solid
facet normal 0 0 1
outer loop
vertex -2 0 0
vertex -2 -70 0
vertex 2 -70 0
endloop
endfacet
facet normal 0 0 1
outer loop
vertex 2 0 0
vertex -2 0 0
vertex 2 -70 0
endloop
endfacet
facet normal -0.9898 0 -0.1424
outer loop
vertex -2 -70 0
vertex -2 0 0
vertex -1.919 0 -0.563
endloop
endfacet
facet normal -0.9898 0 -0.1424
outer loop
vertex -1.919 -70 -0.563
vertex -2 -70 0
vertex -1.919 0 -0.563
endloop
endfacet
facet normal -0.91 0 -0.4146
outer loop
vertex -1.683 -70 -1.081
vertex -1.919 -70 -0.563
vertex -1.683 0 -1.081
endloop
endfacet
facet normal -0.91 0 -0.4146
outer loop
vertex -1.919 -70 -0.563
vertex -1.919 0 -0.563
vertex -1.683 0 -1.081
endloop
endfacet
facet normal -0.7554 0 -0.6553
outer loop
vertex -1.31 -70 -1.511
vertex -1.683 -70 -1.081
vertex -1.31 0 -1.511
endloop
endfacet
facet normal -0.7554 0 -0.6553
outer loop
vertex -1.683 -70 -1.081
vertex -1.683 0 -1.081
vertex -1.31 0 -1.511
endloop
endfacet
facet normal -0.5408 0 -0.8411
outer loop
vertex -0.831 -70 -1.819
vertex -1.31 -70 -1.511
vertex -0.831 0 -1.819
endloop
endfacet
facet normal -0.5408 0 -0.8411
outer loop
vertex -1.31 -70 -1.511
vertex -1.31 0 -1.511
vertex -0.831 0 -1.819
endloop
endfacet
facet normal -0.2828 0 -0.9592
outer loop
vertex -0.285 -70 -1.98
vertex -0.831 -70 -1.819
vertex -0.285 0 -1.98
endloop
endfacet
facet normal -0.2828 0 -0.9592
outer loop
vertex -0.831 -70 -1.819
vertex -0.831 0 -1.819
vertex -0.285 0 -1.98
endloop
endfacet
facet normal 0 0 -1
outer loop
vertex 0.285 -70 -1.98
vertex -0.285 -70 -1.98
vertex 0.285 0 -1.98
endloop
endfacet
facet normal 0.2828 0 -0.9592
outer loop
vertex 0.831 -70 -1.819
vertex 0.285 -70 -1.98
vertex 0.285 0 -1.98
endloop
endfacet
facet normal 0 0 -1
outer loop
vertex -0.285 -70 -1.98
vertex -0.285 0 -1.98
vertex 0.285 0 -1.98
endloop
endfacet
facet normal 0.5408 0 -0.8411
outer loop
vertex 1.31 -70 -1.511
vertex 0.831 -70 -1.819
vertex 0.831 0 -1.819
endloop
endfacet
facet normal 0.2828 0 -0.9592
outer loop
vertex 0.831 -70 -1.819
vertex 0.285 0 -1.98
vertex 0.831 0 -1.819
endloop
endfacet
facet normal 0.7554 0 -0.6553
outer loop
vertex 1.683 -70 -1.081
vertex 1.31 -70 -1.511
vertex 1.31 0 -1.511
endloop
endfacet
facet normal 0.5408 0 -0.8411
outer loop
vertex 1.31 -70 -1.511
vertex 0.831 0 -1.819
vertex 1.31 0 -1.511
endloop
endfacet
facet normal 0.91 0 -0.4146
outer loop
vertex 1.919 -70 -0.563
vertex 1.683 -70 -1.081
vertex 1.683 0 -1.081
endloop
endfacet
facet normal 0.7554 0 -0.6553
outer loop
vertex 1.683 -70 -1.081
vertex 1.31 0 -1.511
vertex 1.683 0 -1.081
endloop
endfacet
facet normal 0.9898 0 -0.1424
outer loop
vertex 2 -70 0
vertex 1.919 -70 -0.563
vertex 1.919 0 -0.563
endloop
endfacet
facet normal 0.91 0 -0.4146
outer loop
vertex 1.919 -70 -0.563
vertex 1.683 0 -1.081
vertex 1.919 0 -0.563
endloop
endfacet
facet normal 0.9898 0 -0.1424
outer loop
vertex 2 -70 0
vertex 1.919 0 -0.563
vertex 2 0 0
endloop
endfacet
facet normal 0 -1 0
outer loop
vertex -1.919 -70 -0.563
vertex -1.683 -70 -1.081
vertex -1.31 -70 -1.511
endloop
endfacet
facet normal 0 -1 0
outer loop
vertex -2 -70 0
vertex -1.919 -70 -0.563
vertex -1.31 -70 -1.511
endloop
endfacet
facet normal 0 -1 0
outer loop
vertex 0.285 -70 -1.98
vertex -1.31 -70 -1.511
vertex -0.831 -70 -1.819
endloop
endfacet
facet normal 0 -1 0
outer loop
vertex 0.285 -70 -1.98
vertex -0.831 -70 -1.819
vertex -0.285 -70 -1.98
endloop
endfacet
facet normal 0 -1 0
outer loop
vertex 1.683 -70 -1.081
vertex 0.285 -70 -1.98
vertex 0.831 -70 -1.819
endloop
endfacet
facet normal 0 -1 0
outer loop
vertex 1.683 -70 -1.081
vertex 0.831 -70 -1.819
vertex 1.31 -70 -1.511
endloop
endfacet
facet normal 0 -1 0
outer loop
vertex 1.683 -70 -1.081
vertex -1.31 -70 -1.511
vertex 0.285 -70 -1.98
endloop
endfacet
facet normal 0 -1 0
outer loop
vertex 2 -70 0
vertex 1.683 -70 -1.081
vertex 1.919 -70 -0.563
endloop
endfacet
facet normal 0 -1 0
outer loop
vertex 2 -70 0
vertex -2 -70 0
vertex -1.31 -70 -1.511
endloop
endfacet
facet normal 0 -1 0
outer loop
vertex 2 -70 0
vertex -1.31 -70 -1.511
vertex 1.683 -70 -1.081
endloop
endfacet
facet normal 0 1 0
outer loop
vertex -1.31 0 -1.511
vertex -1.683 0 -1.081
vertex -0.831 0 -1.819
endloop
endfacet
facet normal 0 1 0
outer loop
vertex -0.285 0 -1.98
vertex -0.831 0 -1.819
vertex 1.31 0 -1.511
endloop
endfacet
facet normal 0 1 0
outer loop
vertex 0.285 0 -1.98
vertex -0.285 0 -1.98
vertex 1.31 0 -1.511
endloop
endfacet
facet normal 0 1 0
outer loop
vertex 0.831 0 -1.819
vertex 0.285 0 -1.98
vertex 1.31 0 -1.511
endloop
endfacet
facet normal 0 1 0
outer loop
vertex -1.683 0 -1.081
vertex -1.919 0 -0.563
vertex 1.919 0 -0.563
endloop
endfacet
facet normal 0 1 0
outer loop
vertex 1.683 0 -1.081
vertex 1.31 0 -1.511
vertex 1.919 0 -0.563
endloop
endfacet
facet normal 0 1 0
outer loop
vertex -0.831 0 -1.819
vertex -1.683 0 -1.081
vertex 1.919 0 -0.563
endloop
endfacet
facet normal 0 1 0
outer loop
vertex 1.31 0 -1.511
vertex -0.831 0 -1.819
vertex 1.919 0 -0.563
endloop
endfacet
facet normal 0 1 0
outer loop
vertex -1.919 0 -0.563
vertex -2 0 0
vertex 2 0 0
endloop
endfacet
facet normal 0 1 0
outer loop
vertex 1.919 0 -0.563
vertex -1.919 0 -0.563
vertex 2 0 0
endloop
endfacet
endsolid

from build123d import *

# Parameters (mm, degrees)
F1_DEPTH = 70
F4_DEPTH = 20
F6_DEPTH = 15
F7_W     = 5.162358
F7_H     = 3.251191
F8_DEPTH = 100


with BuildPart() as f1:
    # F0 (on Front) → F1 (new body)
    with BuildSketch(Plane.XZ):
        with BuildLine():
            Line((-0.5, 2.5), (-0.5, 1.936492))
            ThreePointArc((-0.5, 1.936492), (0, -2), (0.5, 1.936492))
            Line((0.5, 1.936492), (0.5, 2.5))
            Line((0.5, 2.5), (-0.5, 2.5))
        make_face()
    extrude(amount=F1_DEPTH)

    # F3 (on offset) → F4 (cut)
    with BuildSketch(Plane(origin=(0, -60, 0.089144), x_dir=(1, 0, 0), z_dir=(0, -1, 0))):
        with BuildLine():
            ThreePointArc((-0.5, 1.936492), (0.000638, 2), (0.501235, 1.936172))
            Line((0.501235, 1.936172), (0.5, 2.5))
            Line((0.5, 2.5), (-0.5, 2.5))
            Line((-0.5, 2.5), (-0.5, 1.936492))
        make_face()
    extrude(amount=-F4_DEPTH, mode=Mode.SUBTRACT)

    # F5 (on face) → F6 (cut)
    with BuildSketch(Plane.XZ.offset(60)):
        with BuildLine():
            Line((-0.5, 2.5), (-0.5, 1.936492))
            ThreePointArc((-0.5, 1.936492), (0, 2), (0.5, 1.936492))
            Line((0.5, 1.936492), (0.5, 2.5))
            Line((0.5, 2.5), (-0.5, 2.5))
        make_face()
    extrude(amount=-F6_DEPTH, mode=Mode.SUBTRACT)

    # F7 (on face) → F8 (cut)
    with BuildSketch(Plane.XZ.offset(70)):
        with Locations((0.0082, 1.625595)):
            Rectangle(F7_W, F7_H)
    extrude(amount=-F8_DEPTH, mode=Mode.SUBTRACT)


solid = f1.part
